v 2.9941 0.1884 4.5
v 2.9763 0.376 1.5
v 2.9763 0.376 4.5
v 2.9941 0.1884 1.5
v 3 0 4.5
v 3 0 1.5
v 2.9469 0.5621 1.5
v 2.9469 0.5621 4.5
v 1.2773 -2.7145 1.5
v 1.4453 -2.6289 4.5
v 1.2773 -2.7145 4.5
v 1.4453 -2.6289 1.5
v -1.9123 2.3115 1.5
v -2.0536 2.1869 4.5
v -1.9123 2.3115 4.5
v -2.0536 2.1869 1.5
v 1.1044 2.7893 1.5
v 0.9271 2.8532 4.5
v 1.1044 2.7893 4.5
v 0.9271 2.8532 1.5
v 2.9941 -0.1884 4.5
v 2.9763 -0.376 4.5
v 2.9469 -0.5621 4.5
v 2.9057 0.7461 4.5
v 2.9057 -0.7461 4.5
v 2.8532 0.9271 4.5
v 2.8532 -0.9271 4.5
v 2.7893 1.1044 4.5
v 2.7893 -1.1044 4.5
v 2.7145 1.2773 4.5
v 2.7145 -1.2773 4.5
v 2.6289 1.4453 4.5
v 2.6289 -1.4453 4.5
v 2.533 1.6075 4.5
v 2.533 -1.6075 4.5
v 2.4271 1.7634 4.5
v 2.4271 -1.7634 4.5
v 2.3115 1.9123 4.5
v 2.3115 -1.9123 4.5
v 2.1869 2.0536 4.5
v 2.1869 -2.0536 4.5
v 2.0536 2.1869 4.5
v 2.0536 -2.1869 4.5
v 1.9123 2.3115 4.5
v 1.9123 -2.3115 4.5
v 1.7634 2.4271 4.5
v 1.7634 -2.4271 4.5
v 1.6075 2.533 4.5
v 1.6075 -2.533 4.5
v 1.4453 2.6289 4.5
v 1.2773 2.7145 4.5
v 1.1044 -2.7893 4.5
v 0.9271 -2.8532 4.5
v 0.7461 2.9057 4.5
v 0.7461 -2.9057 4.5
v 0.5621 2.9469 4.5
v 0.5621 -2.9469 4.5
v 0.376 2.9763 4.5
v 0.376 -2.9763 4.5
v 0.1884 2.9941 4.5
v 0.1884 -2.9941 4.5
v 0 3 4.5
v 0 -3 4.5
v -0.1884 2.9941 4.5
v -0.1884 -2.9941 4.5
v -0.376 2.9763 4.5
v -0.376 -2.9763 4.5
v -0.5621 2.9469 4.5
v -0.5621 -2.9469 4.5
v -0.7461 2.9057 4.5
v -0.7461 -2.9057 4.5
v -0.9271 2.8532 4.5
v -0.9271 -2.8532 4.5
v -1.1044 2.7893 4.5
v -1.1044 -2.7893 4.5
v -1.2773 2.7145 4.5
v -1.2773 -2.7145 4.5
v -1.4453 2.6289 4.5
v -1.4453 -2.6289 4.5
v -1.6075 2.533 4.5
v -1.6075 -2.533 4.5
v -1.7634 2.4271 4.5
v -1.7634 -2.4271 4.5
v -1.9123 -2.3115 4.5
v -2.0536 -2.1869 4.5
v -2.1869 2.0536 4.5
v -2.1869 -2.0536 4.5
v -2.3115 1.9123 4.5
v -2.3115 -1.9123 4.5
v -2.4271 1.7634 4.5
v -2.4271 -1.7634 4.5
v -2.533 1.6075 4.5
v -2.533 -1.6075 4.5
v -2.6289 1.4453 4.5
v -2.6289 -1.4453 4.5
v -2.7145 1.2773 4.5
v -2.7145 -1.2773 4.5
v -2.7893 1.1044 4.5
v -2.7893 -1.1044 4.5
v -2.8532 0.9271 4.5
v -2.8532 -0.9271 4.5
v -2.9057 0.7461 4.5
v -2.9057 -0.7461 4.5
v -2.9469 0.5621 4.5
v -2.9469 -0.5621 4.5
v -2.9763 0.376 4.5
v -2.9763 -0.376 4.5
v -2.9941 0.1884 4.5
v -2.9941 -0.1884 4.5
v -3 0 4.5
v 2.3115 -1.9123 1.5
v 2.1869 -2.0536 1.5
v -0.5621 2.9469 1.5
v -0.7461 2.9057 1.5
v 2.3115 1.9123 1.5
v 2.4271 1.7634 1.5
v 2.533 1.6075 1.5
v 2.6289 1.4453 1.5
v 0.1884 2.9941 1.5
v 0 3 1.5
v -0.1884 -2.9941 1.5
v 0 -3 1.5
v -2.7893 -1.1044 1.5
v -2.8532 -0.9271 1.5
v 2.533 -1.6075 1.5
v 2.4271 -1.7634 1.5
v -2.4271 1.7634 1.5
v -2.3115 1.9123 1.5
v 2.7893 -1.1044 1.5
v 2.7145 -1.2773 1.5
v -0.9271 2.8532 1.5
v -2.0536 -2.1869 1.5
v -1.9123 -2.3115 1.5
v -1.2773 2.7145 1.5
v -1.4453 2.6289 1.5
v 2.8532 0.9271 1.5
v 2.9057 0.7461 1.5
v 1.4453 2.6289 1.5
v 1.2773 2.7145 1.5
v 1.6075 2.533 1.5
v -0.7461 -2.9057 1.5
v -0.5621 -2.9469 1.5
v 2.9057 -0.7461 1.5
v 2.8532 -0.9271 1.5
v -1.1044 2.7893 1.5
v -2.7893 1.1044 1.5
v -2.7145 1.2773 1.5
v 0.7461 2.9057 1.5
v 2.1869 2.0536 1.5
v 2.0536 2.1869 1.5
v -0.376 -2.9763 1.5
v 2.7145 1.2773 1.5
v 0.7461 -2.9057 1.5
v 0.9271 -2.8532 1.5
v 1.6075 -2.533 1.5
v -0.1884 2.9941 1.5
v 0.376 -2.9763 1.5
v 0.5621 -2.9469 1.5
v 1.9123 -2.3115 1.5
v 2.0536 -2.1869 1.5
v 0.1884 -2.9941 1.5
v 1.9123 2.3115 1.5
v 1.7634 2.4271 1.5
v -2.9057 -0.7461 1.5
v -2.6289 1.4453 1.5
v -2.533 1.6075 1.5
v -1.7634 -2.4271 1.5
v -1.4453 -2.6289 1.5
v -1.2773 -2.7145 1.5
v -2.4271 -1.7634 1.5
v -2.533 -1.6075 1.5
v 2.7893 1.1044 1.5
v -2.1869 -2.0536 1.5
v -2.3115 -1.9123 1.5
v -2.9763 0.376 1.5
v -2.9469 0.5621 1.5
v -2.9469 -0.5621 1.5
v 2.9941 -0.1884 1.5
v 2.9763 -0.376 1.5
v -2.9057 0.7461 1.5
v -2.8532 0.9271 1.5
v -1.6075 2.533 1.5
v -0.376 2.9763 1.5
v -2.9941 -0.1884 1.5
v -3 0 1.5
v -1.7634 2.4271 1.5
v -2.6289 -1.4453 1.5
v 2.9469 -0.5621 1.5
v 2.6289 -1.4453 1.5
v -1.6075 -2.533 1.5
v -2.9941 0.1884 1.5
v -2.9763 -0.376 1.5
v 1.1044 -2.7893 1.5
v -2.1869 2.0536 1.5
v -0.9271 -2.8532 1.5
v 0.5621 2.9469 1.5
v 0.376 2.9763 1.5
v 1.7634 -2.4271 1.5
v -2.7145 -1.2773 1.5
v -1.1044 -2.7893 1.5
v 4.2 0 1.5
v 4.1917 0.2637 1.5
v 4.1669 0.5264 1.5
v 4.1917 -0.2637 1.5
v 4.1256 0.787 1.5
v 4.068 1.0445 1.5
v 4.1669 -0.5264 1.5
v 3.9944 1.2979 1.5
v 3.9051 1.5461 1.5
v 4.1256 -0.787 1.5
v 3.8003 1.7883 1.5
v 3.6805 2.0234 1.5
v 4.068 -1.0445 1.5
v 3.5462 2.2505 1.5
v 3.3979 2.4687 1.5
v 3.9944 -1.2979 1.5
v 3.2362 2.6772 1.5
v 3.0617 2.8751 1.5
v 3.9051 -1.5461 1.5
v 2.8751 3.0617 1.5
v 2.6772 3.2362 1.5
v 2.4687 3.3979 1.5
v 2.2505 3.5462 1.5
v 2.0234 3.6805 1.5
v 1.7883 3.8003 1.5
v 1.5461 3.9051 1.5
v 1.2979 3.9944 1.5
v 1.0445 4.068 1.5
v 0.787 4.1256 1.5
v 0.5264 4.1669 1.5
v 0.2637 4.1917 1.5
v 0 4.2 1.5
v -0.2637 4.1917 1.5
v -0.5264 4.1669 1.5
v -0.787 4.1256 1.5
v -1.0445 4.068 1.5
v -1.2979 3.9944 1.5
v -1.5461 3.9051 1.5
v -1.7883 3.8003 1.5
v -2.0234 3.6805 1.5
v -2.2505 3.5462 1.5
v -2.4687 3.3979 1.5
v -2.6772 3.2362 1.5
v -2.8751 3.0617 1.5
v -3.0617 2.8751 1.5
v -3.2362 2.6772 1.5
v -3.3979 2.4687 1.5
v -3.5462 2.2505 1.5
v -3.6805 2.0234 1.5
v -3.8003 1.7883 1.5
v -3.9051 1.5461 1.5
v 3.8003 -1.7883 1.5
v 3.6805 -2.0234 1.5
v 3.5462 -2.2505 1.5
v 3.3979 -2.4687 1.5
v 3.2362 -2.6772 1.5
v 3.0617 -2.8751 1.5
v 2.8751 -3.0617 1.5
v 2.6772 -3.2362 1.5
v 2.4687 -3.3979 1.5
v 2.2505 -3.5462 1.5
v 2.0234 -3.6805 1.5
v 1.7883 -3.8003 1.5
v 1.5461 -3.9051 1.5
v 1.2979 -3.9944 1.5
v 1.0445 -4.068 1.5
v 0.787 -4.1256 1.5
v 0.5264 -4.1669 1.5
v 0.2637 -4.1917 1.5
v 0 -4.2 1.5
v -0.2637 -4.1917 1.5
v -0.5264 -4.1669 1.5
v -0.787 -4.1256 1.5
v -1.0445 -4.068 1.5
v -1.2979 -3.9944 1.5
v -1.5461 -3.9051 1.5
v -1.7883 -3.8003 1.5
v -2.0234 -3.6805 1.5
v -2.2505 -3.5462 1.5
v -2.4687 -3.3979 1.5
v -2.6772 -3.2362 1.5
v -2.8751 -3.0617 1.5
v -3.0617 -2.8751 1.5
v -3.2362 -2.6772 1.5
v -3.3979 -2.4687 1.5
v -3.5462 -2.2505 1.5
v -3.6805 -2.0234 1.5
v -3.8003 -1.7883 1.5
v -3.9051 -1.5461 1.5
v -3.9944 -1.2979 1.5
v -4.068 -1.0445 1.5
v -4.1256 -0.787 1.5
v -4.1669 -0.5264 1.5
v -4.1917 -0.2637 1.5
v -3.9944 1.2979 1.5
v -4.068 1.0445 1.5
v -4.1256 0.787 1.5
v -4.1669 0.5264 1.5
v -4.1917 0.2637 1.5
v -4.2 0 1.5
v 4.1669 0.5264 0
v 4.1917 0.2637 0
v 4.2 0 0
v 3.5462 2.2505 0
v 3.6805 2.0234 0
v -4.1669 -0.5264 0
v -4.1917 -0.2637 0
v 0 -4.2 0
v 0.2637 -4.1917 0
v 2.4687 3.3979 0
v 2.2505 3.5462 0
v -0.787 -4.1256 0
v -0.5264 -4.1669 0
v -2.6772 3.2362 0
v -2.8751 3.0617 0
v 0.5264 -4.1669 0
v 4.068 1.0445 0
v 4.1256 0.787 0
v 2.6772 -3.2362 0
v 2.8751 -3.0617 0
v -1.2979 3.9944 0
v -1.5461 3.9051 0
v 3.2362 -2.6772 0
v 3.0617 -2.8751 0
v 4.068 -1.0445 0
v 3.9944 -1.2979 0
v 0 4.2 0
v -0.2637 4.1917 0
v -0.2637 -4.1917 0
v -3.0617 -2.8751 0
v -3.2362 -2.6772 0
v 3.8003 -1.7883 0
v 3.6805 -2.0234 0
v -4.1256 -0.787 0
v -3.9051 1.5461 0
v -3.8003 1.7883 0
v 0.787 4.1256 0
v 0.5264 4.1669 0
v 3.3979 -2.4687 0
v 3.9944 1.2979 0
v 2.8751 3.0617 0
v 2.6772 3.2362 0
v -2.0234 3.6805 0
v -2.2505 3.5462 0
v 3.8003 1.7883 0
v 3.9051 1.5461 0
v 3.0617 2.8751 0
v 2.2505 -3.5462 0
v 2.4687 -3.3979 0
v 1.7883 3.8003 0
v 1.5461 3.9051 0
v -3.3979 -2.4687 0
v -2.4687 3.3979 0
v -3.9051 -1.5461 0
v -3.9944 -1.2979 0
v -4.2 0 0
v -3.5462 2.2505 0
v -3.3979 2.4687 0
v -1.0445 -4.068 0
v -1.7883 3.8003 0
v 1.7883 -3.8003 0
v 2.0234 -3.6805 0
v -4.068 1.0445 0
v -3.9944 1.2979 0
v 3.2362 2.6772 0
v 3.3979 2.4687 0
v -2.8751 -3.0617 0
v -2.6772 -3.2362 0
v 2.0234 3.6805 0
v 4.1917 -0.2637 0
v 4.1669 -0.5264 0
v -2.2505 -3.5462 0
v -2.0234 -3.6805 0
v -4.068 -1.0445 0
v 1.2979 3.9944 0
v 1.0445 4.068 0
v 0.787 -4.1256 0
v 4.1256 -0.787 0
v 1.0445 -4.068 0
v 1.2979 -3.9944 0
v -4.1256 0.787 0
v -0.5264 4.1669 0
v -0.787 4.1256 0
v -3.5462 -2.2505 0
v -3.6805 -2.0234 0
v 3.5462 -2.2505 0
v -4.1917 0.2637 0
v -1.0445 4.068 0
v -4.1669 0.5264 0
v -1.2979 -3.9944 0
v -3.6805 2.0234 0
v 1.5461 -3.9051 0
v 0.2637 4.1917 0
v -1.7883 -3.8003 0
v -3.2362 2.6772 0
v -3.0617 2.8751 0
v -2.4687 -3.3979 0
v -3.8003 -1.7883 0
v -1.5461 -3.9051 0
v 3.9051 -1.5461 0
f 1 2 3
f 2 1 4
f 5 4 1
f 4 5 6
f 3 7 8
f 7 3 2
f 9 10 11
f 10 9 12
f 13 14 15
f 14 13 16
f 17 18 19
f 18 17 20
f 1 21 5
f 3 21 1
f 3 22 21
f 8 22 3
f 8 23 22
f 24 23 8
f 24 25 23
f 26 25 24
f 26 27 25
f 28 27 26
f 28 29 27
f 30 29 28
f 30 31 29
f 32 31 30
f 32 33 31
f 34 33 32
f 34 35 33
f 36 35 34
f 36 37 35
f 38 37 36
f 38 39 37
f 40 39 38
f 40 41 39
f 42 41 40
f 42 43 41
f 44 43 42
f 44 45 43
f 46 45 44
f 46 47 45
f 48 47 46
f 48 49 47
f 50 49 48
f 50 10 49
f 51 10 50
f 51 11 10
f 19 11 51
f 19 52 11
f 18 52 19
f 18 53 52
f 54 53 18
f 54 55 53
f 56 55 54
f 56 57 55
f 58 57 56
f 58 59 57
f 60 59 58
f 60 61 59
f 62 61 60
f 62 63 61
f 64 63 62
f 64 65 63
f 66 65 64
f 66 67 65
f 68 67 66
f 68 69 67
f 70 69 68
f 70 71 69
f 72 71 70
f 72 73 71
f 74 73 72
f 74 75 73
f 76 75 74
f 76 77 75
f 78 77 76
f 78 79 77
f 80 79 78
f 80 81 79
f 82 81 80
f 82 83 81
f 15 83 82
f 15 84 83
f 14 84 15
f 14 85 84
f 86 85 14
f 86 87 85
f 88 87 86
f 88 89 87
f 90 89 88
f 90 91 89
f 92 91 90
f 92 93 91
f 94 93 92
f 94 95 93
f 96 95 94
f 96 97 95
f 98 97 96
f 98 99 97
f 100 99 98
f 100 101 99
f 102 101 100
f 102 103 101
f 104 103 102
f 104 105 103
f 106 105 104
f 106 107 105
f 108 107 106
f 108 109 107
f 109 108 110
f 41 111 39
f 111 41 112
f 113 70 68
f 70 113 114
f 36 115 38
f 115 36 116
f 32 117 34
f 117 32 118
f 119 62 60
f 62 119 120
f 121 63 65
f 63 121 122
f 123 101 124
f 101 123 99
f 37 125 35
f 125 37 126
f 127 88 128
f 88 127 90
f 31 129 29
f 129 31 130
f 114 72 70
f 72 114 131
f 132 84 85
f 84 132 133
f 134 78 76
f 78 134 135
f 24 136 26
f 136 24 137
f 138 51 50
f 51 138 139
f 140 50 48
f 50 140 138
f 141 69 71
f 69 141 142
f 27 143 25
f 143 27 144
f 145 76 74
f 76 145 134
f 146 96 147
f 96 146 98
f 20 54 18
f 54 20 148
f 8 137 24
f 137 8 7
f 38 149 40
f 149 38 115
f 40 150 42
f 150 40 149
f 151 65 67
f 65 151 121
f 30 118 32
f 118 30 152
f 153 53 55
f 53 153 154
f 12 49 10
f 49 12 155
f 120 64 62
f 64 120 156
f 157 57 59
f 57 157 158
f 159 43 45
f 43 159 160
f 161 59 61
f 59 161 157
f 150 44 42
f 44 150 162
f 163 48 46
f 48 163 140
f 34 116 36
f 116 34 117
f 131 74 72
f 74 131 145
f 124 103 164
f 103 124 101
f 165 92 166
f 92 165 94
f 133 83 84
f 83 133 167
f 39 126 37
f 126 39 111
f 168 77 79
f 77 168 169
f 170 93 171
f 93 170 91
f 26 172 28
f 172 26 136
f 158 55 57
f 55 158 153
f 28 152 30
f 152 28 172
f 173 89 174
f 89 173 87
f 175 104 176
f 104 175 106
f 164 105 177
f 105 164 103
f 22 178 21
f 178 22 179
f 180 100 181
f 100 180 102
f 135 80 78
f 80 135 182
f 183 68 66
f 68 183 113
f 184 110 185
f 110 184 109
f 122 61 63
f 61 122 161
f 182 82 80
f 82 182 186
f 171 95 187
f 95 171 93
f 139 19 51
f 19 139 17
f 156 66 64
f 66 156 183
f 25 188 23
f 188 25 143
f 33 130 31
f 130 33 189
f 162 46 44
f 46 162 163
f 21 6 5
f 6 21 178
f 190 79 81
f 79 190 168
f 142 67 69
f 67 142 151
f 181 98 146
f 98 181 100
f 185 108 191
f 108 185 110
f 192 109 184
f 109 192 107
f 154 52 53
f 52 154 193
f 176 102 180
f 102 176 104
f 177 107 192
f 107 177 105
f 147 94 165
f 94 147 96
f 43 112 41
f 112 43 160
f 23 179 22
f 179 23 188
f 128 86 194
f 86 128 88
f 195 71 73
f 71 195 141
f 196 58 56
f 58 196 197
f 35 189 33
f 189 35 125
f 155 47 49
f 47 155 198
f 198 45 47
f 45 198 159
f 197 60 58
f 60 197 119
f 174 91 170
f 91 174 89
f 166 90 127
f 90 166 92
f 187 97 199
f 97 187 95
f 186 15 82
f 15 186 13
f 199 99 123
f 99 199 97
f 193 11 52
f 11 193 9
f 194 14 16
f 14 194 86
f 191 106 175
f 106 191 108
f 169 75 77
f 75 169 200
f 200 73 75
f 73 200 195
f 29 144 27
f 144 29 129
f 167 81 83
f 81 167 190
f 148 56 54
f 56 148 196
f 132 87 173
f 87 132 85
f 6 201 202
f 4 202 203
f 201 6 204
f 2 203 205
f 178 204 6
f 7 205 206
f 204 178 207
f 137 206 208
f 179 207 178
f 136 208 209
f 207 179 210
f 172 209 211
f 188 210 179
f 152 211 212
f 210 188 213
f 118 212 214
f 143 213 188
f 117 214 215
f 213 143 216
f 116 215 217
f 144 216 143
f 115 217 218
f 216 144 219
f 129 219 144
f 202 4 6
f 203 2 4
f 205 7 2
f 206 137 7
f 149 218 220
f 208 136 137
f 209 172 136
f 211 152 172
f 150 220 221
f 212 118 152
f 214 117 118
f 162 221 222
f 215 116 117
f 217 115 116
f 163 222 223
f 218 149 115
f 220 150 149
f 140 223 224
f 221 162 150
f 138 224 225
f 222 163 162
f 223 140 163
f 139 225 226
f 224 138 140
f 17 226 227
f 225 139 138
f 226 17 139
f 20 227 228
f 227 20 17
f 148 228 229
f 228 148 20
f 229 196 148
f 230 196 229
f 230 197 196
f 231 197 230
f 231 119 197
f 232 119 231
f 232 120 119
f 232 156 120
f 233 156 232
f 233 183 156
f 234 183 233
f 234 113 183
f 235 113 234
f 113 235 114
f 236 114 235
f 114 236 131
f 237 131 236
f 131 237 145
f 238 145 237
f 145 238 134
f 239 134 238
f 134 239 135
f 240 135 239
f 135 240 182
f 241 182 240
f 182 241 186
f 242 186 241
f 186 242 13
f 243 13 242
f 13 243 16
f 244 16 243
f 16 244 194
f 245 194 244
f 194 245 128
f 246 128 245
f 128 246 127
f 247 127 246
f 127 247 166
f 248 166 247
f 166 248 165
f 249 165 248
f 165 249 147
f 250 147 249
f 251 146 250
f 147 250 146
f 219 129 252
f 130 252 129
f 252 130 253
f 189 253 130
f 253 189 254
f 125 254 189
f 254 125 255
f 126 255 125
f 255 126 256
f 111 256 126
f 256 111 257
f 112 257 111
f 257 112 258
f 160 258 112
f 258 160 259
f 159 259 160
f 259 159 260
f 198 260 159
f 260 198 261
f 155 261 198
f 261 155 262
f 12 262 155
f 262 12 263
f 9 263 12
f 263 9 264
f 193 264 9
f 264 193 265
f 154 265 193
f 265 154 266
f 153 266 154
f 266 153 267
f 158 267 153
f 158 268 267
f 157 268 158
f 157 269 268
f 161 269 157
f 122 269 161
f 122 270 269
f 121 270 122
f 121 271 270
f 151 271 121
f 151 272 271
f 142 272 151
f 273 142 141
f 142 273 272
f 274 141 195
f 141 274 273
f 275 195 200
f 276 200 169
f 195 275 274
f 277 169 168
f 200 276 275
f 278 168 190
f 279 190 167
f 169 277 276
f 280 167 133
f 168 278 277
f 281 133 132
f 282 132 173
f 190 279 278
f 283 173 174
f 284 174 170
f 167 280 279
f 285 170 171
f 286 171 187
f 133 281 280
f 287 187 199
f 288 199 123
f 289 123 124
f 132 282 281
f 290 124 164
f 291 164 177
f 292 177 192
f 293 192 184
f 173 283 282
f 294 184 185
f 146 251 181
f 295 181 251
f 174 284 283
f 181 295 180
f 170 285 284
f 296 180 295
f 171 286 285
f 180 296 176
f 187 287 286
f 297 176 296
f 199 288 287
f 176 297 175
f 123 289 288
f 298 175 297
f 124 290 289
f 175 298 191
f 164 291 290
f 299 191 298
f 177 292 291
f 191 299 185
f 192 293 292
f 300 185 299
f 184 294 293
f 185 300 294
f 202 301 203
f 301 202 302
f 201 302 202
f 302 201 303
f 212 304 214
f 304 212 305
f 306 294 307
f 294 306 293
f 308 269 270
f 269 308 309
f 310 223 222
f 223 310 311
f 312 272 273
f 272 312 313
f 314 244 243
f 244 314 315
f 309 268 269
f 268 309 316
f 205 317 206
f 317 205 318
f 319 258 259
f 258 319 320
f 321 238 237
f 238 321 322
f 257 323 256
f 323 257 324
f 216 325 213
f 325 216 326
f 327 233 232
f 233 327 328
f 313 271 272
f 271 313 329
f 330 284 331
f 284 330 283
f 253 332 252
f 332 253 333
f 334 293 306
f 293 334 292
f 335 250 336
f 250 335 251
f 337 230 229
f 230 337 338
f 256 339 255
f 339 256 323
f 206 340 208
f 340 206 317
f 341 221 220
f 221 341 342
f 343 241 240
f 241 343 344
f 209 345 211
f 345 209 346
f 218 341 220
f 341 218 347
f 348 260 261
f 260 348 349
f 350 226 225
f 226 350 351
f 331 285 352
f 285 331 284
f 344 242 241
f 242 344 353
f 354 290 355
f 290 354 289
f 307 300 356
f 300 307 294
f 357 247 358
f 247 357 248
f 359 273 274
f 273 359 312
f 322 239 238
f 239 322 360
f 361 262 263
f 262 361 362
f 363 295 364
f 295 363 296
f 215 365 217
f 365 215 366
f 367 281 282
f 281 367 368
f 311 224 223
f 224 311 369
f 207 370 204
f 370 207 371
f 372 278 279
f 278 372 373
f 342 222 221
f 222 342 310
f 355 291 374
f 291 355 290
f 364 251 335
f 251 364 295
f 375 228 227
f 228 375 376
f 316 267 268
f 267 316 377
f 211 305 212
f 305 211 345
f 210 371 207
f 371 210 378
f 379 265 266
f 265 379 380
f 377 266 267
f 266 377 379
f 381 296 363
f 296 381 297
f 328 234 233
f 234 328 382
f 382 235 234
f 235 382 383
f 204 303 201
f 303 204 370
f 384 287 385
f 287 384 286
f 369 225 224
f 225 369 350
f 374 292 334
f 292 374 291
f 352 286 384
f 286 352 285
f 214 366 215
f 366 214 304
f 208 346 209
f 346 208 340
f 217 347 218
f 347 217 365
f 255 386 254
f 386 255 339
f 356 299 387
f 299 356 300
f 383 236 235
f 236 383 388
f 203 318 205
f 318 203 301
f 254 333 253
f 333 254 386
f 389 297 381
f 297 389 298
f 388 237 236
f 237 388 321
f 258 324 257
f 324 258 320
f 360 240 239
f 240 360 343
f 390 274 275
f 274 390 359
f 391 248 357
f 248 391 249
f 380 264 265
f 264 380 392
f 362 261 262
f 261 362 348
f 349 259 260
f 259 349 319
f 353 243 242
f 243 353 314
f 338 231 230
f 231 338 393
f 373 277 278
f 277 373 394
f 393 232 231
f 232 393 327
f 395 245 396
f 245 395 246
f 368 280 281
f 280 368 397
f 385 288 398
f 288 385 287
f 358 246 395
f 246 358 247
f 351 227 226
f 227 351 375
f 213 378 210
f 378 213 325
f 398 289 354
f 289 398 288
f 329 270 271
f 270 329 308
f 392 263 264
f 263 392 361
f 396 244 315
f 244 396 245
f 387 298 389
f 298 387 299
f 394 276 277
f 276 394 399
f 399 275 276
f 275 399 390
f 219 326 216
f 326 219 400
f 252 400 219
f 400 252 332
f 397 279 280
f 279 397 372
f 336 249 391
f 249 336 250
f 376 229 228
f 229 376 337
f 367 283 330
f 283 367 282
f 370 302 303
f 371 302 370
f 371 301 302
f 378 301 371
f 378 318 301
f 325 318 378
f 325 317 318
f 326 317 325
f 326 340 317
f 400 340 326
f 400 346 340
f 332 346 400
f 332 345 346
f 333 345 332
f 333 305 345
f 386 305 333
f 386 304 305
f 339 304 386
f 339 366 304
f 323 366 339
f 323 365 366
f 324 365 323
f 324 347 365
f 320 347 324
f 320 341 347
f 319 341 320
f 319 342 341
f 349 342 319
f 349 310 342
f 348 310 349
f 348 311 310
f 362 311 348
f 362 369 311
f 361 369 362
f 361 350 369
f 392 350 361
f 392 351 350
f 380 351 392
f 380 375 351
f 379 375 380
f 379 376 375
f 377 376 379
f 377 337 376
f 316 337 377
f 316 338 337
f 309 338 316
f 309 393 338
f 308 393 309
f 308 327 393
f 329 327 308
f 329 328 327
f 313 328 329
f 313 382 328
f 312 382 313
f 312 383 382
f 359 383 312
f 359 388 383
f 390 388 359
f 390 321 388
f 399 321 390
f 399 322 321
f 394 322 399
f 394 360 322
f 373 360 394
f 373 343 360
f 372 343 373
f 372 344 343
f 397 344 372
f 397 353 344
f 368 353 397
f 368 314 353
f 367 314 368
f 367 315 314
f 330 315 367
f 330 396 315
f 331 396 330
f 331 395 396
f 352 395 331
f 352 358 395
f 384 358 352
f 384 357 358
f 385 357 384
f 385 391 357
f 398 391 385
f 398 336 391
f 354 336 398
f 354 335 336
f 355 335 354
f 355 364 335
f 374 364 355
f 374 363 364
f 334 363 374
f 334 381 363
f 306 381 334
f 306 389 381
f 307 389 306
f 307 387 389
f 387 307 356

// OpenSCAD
translate([0,0,1.5]) {
  cylinder(3, 3, 3, false, $fn=100);
}


cylinder(1.5, 4.2, 4.2, false, $fn=100);
